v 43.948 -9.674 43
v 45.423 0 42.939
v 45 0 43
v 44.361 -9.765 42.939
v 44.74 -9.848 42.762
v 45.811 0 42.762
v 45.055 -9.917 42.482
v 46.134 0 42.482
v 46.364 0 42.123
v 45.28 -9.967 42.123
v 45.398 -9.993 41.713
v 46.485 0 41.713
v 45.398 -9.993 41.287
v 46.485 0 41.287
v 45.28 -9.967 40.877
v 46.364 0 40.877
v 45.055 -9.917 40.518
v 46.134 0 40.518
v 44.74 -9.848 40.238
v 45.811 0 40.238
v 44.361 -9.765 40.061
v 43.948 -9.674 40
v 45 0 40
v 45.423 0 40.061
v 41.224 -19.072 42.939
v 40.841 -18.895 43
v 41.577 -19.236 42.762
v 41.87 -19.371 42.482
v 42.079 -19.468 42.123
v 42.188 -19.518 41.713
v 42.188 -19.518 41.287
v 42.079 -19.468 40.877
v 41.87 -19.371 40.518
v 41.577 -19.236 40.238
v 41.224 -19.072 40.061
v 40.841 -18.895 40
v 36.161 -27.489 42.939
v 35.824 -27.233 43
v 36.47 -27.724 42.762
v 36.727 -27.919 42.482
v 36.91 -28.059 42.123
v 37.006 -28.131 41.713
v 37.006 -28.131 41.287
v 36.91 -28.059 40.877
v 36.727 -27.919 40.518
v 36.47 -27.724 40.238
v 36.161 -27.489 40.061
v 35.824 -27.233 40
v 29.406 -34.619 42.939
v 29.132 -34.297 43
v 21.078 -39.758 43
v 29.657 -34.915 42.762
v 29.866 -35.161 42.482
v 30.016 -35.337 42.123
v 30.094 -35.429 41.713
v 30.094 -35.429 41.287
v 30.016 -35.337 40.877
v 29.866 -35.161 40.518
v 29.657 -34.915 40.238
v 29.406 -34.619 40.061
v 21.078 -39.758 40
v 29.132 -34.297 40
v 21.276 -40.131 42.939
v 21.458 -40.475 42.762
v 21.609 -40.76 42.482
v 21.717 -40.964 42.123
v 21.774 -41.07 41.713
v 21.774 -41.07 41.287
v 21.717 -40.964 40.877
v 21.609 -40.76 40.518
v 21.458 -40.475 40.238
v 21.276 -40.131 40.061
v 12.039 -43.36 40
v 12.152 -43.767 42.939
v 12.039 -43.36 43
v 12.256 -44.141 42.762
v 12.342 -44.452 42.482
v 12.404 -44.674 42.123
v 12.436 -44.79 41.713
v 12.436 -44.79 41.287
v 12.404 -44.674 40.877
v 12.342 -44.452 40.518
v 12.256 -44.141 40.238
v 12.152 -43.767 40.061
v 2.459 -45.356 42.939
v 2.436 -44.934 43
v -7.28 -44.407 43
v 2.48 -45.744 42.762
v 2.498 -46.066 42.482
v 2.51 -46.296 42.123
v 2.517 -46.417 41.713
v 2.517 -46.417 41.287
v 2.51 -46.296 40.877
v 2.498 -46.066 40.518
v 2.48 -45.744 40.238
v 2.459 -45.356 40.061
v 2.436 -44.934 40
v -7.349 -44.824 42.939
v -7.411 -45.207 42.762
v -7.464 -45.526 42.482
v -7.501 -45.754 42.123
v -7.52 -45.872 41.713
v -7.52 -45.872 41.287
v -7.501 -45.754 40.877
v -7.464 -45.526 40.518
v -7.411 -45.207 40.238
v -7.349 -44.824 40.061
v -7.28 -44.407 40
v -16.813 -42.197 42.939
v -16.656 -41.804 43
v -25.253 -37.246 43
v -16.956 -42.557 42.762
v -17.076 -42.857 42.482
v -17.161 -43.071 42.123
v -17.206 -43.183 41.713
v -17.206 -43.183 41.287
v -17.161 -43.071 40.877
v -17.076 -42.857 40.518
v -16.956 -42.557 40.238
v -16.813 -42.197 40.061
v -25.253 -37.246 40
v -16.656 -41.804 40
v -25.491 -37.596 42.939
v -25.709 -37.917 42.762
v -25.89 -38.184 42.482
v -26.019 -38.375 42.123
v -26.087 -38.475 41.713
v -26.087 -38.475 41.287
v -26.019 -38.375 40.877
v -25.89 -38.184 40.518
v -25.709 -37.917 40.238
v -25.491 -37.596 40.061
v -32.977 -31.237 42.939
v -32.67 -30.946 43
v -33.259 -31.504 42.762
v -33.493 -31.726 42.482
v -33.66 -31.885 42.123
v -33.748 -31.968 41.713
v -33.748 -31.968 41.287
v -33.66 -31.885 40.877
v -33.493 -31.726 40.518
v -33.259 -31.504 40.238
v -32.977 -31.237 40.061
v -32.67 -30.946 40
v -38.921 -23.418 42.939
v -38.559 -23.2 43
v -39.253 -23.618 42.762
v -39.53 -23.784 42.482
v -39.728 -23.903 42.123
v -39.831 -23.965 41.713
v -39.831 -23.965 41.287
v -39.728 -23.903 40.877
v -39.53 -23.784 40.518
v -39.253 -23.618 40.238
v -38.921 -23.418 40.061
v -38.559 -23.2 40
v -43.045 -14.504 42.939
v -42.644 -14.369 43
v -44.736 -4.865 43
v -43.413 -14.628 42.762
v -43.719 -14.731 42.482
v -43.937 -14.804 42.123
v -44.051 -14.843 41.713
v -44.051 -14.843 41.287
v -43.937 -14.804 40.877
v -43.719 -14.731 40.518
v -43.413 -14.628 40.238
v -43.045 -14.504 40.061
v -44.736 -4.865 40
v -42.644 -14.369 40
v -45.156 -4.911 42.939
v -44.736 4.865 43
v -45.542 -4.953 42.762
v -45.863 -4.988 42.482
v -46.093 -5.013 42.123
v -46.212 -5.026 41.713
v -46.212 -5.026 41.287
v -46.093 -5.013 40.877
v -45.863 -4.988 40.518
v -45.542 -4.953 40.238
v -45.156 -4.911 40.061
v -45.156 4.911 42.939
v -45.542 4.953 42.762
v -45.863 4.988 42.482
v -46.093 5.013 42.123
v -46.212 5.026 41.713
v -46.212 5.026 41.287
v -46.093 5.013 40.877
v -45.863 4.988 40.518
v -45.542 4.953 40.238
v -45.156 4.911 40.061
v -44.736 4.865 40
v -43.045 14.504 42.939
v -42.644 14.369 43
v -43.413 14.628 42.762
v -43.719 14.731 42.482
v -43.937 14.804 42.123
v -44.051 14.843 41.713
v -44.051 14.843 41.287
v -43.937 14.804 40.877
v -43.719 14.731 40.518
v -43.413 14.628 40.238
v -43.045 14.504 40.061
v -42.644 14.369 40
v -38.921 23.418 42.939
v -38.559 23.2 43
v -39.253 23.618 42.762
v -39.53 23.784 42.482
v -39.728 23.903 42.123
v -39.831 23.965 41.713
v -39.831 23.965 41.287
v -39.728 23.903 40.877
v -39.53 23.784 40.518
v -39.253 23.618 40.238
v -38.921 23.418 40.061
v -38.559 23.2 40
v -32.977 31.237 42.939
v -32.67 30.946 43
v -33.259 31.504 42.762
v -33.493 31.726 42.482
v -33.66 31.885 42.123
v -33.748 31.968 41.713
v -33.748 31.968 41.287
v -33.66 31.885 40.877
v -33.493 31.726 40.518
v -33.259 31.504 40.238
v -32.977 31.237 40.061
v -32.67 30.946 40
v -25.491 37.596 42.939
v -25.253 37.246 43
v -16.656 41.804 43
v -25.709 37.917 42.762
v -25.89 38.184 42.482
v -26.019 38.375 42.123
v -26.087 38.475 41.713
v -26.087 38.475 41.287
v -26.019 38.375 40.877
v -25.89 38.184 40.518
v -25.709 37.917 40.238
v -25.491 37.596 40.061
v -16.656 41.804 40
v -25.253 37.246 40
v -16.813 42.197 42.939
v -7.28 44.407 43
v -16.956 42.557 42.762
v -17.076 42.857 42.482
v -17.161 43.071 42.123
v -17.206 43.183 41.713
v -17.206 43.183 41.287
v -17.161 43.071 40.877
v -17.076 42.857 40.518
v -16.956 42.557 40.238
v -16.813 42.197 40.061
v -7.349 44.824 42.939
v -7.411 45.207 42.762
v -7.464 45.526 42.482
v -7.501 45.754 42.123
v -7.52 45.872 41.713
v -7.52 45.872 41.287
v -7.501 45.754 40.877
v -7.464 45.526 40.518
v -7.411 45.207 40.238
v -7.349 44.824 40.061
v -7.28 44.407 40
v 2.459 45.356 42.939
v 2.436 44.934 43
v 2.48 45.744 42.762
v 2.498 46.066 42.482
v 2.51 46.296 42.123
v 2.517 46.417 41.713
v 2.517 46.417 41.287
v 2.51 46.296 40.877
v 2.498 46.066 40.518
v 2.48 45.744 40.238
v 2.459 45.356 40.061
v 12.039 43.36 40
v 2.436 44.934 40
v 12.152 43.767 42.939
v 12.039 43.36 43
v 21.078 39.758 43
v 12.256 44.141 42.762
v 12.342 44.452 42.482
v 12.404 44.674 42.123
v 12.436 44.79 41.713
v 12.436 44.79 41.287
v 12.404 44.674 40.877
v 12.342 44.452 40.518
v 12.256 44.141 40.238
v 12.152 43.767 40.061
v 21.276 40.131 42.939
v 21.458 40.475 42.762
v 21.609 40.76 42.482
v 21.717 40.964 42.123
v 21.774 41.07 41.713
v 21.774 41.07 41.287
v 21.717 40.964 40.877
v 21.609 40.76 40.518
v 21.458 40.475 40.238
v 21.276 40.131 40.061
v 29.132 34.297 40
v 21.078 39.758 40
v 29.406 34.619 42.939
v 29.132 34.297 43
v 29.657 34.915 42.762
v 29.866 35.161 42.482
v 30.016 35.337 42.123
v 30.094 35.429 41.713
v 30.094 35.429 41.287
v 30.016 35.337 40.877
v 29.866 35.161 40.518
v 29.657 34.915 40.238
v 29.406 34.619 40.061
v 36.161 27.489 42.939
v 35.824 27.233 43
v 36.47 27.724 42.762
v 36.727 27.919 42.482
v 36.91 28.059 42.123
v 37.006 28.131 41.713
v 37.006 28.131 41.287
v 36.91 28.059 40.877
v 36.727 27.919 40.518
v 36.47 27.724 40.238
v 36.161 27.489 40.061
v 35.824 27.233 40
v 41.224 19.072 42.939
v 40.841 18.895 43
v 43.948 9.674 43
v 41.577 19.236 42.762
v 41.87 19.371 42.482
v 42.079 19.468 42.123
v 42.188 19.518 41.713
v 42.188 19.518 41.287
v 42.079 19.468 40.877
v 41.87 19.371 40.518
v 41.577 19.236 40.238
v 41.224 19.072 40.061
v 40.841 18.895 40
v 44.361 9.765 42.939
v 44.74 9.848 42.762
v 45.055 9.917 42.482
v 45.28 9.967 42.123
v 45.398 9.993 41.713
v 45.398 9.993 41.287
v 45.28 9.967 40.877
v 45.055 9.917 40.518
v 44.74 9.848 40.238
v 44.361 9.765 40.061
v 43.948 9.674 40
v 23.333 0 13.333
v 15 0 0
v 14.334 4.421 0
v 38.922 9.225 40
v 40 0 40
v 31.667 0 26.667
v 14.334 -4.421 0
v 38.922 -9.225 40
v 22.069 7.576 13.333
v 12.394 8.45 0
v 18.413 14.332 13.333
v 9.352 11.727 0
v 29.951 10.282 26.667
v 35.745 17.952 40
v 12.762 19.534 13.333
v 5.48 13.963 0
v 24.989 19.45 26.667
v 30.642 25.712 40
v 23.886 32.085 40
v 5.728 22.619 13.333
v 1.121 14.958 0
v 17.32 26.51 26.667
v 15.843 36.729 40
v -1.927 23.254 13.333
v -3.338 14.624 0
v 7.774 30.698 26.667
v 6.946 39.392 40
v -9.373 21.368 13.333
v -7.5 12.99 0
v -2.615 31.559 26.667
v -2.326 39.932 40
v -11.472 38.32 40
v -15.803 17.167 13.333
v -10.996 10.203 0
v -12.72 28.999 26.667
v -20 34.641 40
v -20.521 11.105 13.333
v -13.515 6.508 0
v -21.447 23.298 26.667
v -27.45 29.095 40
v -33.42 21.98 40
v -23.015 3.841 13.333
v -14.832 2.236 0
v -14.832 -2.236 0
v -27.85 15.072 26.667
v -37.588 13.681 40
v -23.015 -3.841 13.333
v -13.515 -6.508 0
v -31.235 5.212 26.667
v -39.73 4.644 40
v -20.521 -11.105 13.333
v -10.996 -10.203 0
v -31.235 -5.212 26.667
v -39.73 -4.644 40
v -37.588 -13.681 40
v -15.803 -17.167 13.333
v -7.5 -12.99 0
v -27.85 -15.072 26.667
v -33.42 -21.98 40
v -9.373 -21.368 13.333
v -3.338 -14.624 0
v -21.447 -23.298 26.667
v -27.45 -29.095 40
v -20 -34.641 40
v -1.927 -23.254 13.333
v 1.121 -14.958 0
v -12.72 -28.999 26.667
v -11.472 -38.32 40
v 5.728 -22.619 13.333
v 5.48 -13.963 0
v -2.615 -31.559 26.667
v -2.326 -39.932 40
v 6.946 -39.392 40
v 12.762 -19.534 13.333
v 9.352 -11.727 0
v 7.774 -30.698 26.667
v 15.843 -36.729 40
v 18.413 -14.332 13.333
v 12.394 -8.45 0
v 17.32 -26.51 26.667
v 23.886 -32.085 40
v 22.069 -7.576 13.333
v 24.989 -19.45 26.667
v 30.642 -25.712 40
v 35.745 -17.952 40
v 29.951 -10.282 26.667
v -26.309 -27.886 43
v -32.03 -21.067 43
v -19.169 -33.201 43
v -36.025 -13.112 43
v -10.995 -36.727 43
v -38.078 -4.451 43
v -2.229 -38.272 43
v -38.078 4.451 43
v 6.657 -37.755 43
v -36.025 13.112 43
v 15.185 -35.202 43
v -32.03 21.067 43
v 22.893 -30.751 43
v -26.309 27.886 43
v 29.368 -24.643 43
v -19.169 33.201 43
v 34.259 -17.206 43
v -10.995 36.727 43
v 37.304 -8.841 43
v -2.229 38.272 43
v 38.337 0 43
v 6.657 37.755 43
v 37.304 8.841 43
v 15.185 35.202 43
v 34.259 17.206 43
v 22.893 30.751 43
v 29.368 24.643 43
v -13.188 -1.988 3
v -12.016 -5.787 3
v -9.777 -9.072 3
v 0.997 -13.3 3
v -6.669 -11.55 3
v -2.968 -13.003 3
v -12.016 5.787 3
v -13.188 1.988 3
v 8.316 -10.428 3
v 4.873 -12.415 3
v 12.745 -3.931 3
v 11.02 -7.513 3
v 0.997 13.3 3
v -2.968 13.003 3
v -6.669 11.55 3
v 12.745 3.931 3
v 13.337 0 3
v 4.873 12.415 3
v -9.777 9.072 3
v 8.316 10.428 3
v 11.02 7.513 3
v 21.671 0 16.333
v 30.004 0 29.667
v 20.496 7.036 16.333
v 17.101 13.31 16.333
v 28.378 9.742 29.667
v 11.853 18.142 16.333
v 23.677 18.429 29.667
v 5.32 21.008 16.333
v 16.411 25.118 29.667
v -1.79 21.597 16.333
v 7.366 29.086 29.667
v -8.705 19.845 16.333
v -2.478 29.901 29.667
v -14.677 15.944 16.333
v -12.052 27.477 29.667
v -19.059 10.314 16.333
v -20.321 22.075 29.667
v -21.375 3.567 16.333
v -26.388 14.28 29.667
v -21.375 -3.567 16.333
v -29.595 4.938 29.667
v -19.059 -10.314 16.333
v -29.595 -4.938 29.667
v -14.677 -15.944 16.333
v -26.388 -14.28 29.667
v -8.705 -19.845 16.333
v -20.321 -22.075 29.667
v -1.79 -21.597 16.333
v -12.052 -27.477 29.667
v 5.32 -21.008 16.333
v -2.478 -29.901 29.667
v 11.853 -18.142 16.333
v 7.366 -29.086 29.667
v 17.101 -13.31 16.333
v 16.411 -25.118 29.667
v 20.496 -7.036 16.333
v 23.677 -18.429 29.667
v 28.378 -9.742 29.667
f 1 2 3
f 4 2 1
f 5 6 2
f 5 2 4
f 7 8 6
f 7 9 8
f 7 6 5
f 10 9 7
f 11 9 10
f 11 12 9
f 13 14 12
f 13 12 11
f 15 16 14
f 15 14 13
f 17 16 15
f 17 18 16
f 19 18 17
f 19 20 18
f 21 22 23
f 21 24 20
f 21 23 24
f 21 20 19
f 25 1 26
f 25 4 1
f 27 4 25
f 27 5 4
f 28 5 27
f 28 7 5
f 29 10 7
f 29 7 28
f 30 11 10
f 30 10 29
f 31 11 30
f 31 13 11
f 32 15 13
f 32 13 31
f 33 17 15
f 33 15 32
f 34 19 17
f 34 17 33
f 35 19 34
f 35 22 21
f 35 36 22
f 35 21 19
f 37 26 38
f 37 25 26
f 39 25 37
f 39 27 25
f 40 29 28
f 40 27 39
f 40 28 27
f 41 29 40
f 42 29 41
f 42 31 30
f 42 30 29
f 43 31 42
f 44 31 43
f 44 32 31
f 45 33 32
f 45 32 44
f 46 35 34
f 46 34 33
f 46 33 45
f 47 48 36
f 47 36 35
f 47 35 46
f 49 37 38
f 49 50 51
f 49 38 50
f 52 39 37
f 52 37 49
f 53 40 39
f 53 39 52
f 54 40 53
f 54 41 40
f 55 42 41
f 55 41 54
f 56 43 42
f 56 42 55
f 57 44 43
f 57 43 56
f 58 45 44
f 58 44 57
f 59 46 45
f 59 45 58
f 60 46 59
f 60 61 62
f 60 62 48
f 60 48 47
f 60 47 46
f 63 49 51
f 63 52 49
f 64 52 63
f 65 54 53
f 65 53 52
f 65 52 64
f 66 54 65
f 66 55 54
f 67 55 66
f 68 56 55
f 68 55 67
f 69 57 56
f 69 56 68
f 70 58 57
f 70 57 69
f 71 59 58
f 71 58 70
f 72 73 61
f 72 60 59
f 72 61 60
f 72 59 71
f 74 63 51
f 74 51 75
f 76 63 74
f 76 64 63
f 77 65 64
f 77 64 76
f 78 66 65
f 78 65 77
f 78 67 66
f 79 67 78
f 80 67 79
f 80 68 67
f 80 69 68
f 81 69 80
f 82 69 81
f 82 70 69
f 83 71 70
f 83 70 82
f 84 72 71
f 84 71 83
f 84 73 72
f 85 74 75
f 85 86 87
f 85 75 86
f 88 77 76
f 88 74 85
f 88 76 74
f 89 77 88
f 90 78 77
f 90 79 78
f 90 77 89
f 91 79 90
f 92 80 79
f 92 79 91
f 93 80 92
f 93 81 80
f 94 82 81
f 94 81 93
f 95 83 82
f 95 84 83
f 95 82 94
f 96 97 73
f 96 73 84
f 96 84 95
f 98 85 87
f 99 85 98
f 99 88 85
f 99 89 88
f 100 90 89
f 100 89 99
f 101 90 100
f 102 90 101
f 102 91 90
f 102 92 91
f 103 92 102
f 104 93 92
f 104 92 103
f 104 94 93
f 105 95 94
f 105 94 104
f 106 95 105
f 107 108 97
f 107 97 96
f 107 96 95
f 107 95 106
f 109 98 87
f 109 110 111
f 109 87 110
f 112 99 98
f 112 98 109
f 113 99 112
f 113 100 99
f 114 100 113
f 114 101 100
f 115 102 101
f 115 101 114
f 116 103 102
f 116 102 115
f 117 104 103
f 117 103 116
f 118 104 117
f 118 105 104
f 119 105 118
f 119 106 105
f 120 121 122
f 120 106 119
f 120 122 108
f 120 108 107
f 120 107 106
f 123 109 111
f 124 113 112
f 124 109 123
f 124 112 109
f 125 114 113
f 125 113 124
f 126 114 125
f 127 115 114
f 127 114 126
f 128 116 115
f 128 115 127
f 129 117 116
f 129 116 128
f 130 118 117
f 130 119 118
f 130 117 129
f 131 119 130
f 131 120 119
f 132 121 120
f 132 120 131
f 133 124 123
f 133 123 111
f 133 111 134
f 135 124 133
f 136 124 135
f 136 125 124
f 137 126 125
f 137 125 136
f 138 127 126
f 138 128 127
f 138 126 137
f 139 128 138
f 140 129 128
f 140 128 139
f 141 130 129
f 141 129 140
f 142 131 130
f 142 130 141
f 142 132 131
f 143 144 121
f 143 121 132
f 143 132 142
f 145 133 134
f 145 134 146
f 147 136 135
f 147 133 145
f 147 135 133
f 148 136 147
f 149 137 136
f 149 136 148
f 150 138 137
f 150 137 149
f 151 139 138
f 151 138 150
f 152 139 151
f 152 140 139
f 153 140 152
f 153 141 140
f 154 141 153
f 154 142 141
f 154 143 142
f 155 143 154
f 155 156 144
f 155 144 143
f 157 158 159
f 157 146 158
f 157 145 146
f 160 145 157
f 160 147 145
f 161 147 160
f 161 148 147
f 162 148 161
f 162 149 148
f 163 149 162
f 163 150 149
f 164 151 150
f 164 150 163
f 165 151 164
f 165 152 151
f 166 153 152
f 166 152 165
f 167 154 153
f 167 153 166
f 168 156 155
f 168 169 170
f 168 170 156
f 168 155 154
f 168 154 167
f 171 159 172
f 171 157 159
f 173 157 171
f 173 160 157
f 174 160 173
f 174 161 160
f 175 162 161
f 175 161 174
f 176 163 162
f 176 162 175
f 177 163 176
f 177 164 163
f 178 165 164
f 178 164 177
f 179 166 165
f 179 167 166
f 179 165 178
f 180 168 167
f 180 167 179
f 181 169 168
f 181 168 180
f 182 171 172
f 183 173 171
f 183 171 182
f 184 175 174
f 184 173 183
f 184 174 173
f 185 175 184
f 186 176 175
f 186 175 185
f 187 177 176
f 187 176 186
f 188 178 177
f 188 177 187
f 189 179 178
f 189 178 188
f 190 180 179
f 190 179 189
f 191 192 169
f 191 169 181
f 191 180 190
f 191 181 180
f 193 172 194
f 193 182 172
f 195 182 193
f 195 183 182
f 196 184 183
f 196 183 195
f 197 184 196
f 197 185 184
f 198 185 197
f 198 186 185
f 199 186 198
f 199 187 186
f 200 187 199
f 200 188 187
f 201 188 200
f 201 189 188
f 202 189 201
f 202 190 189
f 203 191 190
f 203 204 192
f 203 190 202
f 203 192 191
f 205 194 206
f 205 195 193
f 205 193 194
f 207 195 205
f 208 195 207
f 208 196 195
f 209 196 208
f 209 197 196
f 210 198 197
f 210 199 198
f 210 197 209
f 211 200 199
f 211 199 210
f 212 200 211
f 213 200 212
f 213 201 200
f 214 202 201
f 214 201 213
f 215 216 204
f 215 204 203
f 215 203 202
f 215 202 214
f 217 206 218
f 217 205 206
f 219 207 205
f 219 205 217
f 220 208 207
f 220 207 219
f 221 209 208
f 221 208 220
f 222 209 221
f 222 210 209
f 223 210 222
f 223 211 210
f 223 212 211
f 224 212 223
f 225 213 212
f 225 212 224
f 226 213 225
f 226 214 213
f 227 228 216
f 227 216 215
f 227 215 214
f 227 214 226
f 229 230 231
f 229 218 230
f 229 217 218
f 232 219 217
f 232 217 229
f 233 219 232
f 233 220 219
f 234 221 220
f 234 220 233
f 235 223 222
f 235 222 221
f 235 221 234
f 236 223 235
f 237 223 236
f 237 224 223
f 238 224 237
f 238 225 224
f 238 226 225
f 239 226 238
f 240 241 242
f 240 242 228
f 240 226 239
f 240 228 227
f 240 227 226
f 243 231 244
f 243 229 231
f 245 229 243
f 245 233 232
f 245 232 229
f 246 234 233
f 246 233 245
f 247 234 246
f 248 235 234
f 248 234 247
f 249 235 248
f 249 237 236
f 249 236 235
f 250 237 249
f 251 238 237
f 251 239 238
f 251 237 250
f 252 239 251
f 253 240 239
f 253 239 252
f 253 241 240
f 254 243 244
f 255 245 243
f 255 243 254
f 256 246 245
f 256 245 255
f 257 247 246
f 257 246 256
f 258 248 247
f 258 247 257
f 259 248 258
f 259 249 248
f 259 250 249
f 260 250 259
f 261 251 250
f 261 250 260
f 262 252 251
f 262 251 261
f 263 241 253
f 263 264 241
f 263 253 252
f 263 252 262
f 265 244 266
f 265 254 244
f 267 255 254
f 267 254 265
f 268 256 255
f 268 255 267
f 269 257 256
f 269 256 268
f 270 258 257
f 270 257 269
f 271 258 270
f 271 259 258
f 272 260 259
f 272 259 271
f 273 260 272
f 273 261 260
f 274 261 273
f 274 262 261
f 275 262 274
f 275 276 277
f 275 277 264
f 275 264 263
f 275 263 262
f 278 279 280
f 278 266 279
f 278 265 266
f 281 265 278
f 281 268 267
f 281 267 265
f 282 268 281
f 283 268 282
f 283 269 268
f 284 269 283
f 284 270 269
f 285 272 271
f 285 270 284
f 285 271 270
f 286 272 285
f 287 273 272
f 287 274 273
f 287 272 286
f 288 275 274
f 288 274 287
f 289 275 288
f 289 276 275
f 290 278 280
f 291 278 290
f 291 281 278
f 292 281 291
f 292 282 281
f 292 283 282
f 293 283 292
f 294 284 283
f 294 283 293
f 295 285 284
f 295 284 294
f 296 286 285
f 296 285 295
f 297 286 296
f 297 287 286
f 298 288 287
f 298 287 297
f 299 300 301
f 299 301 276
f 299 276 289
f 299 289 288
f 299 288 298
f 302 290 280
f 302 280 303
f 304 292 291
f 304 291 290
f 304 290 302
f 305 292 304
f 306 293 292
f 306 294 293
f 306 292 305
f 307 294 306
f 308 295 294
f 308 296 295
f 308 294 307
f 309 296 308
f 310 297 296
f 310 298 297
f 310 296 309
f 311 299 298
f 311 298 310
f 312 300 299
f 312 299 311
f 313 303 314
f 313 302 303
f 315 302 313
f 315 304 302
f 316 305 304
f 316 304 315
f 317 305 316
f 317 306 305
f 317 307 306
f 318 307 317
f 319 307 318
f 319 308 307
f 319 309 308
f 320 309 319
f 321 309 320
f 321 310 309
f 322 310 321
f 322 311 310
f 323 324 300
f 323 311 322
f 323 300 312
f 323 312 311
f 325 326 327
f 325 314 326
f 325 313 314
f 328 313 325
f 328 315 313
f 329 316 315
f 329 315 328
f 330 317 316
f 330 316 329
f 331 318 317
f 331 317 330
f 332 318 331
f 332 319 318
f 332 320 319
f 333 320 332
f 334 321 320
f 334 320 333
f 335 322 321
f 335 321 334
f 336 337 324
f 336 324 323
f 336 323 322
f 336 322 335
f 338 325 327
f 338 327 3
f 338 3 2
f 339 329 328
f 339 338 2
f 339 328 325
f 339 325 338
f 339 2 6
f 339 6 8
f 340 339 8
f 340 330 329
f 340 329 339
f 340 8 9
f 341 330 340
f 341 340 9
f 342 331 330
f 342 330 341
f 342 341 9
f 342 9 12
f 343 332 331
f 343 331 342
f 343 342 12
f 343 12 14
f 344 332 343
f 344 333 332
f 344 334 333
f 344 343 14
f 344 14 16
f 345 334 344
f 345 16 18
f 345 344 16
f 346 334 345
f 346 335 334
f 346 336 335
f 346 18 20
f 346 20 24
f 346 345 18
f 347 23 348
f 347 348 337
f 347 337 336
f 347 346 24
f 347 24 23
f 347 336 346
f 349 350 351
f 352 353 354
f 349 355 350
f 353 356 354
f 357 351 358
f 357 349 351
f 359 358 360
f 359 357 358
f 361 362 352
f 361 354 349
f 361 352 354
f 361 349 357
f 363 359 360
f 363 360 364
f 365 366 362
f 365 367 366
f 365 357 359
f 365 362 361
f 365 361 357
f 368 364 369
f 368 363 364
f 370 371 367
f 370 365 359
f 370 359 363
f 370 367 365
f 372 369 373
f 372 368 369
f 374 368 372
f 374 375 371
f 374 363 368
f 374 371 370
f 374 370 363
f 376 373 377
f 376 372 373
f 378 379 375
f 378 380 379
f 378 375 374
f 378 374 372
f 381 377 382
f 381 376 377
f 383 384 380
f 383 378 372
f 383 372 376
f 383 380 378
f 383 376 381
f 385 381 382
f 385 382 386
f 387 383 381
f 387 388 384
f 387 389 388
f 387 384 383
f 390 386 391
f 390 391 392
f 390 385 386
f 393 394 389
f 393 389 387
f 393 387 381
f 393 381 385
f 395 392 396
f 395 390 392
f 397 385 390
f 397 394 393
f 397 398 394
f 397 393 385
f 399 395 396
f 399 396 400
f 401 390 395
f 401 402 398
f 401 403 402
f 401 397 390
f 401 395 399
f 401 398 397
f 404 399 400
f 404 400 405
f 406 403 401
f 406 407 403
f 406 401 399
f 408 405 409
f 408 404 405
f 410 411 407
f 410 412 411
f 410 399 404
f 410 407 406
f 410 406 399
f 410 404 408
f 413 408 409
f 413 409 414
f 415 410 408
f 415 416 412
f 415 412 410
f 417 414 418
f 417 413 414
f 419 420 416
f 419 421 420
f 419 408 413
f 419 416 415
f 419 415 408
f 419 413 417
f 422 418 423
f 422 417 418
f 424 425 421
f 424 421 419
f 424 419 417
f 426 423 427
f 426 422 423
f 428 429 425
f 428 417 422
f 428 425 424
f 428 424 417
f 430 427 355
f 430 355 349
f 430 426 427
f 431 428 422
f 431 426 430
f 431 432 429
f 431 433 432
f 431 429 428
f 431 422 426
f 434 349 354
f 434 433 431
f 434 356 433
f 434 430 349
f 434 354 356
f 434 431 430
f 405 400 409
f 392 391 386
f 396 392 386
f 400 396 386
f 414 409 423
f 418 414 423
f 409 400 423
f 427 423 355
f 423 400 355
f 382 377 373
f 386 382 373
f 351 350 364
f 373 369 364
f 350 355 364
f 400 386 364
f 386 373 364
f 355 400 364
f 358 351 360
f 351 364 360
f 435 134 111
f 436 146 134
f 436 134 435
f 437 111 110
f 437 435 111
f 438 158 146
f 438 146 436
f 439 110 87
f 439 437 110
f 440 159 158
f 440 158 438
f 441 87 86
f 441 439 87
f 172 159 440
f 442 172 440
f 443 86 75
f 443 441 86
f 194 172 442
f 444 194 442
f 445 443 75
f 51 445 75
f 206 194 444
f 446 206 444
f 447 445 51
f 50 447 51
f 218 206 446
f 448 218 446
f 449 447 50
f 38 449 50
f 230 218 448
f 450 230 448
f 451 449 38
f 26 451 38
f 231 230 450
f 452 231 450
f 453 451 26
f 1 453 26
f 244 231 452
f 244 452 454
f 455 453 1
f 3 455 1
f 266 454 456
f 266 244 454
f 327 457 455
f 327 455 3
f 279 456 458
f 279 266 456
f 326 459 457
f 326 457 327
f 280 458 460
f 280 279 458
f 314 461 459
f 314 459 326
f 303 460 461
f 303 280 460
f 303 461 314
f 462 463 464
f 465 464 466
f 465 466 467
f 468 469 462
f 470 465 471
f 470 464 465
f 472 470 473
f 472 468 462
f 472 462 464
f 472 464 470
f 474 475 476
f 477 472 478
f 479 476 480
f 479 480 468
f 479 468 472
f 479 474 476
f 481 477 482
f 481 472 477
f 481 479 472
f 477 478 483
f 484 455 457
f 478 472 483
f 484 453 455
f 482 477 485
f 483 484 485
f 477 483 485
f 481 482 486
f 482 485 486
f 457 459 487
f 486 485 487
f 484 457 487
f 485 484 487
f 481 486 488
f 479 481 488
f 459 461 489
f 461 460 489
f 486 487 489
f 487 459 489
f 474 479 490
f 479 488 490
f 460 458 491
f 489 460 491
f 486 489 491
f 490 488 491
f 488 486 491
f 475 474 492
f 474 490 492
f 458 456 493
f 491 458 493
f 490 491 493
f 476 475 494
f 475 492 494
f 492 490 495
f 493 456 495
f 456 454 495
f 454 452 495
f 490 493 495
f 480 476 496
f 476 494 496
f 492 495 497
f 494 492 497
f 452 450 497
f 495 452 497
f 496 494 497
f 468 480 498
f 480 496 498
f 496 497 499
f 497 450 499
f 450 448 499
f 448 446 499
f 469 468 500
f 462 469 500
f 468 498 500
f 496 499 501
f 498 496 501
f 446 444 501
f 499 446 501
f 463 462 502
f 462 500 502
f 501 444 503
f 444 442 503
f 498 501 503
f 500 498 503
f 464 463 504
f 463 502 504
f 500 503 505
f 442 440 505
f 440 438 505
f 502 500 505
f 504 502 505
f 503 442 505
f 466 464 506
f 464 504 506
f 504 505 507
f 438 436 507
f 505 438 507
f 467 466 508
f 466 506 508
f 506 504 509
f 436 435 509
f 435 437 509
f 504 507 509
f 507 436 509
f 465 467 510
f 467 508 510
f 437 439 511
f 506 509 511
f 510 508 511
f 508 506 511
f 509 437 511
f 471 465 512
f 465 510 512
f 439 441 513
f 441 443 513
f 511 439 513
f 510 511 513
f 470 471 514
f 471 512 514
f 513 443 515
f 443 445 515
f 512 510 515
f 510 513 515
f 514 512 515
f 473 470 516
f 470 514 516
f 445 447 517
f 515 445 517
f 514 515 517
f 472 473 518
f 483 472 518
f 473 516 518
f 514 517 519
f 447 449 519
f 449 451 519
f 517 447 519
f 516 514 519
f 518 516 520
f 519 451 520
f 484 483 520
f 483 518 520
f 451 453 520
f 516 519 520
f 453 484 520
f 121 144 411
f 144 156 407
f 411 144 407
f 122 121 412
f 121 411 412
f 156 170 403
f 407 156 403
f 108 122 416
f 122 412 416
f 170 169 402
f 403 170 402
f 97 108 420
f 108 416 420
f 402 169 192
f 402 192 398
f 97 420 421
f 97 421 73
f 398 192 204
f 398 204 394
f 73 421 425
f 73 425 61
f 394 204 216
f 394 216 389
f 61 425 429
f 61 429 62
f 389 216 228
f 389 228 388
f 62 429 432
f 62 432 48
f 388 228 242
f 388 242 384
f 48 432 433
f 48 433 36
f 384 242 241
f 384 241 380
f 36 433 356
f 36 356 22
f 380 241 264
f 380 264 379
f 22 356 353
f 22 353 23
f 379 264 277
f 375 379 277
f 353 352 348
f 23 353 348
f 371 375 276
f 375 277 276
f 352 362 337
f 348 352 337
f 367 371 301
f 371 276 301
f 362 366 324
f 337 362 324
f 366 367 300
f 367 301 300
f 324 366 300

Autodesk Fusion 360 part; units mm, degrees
sketch "Sketch1" plane through (0, 0, 0) normal (0, 1, 0) x (1, 0, 0) in component "bowl"
  line L0 (0, 0) -> (15, 0)
  line L1 (15, 0) -> (40, -40)
  line L2 (40, -40) -> (45, -40)
  line L3 (0, -3) -> (13.3373, -3)
  line L4 (13.3373, -3) -> (38.3373, -43)
  line L5 (38.3373, -43) -> (45, -43)
  arc A0 (45, -43) -> (45, -40) centre (45, -41.5) ccw
  line L6 (0, -3) -> (0, 0)
  dimension "d1" = 3
revolve "Revolve1" add sketch "Sketch1" angle 360 about axis through (0, 0, 1.75) along (0, 0, 1) in component "bowl"
component "bowl" placed x (1, 0, 0) y (0, 1, 0) z (0, 0, 1) at (0, 0, 0)
